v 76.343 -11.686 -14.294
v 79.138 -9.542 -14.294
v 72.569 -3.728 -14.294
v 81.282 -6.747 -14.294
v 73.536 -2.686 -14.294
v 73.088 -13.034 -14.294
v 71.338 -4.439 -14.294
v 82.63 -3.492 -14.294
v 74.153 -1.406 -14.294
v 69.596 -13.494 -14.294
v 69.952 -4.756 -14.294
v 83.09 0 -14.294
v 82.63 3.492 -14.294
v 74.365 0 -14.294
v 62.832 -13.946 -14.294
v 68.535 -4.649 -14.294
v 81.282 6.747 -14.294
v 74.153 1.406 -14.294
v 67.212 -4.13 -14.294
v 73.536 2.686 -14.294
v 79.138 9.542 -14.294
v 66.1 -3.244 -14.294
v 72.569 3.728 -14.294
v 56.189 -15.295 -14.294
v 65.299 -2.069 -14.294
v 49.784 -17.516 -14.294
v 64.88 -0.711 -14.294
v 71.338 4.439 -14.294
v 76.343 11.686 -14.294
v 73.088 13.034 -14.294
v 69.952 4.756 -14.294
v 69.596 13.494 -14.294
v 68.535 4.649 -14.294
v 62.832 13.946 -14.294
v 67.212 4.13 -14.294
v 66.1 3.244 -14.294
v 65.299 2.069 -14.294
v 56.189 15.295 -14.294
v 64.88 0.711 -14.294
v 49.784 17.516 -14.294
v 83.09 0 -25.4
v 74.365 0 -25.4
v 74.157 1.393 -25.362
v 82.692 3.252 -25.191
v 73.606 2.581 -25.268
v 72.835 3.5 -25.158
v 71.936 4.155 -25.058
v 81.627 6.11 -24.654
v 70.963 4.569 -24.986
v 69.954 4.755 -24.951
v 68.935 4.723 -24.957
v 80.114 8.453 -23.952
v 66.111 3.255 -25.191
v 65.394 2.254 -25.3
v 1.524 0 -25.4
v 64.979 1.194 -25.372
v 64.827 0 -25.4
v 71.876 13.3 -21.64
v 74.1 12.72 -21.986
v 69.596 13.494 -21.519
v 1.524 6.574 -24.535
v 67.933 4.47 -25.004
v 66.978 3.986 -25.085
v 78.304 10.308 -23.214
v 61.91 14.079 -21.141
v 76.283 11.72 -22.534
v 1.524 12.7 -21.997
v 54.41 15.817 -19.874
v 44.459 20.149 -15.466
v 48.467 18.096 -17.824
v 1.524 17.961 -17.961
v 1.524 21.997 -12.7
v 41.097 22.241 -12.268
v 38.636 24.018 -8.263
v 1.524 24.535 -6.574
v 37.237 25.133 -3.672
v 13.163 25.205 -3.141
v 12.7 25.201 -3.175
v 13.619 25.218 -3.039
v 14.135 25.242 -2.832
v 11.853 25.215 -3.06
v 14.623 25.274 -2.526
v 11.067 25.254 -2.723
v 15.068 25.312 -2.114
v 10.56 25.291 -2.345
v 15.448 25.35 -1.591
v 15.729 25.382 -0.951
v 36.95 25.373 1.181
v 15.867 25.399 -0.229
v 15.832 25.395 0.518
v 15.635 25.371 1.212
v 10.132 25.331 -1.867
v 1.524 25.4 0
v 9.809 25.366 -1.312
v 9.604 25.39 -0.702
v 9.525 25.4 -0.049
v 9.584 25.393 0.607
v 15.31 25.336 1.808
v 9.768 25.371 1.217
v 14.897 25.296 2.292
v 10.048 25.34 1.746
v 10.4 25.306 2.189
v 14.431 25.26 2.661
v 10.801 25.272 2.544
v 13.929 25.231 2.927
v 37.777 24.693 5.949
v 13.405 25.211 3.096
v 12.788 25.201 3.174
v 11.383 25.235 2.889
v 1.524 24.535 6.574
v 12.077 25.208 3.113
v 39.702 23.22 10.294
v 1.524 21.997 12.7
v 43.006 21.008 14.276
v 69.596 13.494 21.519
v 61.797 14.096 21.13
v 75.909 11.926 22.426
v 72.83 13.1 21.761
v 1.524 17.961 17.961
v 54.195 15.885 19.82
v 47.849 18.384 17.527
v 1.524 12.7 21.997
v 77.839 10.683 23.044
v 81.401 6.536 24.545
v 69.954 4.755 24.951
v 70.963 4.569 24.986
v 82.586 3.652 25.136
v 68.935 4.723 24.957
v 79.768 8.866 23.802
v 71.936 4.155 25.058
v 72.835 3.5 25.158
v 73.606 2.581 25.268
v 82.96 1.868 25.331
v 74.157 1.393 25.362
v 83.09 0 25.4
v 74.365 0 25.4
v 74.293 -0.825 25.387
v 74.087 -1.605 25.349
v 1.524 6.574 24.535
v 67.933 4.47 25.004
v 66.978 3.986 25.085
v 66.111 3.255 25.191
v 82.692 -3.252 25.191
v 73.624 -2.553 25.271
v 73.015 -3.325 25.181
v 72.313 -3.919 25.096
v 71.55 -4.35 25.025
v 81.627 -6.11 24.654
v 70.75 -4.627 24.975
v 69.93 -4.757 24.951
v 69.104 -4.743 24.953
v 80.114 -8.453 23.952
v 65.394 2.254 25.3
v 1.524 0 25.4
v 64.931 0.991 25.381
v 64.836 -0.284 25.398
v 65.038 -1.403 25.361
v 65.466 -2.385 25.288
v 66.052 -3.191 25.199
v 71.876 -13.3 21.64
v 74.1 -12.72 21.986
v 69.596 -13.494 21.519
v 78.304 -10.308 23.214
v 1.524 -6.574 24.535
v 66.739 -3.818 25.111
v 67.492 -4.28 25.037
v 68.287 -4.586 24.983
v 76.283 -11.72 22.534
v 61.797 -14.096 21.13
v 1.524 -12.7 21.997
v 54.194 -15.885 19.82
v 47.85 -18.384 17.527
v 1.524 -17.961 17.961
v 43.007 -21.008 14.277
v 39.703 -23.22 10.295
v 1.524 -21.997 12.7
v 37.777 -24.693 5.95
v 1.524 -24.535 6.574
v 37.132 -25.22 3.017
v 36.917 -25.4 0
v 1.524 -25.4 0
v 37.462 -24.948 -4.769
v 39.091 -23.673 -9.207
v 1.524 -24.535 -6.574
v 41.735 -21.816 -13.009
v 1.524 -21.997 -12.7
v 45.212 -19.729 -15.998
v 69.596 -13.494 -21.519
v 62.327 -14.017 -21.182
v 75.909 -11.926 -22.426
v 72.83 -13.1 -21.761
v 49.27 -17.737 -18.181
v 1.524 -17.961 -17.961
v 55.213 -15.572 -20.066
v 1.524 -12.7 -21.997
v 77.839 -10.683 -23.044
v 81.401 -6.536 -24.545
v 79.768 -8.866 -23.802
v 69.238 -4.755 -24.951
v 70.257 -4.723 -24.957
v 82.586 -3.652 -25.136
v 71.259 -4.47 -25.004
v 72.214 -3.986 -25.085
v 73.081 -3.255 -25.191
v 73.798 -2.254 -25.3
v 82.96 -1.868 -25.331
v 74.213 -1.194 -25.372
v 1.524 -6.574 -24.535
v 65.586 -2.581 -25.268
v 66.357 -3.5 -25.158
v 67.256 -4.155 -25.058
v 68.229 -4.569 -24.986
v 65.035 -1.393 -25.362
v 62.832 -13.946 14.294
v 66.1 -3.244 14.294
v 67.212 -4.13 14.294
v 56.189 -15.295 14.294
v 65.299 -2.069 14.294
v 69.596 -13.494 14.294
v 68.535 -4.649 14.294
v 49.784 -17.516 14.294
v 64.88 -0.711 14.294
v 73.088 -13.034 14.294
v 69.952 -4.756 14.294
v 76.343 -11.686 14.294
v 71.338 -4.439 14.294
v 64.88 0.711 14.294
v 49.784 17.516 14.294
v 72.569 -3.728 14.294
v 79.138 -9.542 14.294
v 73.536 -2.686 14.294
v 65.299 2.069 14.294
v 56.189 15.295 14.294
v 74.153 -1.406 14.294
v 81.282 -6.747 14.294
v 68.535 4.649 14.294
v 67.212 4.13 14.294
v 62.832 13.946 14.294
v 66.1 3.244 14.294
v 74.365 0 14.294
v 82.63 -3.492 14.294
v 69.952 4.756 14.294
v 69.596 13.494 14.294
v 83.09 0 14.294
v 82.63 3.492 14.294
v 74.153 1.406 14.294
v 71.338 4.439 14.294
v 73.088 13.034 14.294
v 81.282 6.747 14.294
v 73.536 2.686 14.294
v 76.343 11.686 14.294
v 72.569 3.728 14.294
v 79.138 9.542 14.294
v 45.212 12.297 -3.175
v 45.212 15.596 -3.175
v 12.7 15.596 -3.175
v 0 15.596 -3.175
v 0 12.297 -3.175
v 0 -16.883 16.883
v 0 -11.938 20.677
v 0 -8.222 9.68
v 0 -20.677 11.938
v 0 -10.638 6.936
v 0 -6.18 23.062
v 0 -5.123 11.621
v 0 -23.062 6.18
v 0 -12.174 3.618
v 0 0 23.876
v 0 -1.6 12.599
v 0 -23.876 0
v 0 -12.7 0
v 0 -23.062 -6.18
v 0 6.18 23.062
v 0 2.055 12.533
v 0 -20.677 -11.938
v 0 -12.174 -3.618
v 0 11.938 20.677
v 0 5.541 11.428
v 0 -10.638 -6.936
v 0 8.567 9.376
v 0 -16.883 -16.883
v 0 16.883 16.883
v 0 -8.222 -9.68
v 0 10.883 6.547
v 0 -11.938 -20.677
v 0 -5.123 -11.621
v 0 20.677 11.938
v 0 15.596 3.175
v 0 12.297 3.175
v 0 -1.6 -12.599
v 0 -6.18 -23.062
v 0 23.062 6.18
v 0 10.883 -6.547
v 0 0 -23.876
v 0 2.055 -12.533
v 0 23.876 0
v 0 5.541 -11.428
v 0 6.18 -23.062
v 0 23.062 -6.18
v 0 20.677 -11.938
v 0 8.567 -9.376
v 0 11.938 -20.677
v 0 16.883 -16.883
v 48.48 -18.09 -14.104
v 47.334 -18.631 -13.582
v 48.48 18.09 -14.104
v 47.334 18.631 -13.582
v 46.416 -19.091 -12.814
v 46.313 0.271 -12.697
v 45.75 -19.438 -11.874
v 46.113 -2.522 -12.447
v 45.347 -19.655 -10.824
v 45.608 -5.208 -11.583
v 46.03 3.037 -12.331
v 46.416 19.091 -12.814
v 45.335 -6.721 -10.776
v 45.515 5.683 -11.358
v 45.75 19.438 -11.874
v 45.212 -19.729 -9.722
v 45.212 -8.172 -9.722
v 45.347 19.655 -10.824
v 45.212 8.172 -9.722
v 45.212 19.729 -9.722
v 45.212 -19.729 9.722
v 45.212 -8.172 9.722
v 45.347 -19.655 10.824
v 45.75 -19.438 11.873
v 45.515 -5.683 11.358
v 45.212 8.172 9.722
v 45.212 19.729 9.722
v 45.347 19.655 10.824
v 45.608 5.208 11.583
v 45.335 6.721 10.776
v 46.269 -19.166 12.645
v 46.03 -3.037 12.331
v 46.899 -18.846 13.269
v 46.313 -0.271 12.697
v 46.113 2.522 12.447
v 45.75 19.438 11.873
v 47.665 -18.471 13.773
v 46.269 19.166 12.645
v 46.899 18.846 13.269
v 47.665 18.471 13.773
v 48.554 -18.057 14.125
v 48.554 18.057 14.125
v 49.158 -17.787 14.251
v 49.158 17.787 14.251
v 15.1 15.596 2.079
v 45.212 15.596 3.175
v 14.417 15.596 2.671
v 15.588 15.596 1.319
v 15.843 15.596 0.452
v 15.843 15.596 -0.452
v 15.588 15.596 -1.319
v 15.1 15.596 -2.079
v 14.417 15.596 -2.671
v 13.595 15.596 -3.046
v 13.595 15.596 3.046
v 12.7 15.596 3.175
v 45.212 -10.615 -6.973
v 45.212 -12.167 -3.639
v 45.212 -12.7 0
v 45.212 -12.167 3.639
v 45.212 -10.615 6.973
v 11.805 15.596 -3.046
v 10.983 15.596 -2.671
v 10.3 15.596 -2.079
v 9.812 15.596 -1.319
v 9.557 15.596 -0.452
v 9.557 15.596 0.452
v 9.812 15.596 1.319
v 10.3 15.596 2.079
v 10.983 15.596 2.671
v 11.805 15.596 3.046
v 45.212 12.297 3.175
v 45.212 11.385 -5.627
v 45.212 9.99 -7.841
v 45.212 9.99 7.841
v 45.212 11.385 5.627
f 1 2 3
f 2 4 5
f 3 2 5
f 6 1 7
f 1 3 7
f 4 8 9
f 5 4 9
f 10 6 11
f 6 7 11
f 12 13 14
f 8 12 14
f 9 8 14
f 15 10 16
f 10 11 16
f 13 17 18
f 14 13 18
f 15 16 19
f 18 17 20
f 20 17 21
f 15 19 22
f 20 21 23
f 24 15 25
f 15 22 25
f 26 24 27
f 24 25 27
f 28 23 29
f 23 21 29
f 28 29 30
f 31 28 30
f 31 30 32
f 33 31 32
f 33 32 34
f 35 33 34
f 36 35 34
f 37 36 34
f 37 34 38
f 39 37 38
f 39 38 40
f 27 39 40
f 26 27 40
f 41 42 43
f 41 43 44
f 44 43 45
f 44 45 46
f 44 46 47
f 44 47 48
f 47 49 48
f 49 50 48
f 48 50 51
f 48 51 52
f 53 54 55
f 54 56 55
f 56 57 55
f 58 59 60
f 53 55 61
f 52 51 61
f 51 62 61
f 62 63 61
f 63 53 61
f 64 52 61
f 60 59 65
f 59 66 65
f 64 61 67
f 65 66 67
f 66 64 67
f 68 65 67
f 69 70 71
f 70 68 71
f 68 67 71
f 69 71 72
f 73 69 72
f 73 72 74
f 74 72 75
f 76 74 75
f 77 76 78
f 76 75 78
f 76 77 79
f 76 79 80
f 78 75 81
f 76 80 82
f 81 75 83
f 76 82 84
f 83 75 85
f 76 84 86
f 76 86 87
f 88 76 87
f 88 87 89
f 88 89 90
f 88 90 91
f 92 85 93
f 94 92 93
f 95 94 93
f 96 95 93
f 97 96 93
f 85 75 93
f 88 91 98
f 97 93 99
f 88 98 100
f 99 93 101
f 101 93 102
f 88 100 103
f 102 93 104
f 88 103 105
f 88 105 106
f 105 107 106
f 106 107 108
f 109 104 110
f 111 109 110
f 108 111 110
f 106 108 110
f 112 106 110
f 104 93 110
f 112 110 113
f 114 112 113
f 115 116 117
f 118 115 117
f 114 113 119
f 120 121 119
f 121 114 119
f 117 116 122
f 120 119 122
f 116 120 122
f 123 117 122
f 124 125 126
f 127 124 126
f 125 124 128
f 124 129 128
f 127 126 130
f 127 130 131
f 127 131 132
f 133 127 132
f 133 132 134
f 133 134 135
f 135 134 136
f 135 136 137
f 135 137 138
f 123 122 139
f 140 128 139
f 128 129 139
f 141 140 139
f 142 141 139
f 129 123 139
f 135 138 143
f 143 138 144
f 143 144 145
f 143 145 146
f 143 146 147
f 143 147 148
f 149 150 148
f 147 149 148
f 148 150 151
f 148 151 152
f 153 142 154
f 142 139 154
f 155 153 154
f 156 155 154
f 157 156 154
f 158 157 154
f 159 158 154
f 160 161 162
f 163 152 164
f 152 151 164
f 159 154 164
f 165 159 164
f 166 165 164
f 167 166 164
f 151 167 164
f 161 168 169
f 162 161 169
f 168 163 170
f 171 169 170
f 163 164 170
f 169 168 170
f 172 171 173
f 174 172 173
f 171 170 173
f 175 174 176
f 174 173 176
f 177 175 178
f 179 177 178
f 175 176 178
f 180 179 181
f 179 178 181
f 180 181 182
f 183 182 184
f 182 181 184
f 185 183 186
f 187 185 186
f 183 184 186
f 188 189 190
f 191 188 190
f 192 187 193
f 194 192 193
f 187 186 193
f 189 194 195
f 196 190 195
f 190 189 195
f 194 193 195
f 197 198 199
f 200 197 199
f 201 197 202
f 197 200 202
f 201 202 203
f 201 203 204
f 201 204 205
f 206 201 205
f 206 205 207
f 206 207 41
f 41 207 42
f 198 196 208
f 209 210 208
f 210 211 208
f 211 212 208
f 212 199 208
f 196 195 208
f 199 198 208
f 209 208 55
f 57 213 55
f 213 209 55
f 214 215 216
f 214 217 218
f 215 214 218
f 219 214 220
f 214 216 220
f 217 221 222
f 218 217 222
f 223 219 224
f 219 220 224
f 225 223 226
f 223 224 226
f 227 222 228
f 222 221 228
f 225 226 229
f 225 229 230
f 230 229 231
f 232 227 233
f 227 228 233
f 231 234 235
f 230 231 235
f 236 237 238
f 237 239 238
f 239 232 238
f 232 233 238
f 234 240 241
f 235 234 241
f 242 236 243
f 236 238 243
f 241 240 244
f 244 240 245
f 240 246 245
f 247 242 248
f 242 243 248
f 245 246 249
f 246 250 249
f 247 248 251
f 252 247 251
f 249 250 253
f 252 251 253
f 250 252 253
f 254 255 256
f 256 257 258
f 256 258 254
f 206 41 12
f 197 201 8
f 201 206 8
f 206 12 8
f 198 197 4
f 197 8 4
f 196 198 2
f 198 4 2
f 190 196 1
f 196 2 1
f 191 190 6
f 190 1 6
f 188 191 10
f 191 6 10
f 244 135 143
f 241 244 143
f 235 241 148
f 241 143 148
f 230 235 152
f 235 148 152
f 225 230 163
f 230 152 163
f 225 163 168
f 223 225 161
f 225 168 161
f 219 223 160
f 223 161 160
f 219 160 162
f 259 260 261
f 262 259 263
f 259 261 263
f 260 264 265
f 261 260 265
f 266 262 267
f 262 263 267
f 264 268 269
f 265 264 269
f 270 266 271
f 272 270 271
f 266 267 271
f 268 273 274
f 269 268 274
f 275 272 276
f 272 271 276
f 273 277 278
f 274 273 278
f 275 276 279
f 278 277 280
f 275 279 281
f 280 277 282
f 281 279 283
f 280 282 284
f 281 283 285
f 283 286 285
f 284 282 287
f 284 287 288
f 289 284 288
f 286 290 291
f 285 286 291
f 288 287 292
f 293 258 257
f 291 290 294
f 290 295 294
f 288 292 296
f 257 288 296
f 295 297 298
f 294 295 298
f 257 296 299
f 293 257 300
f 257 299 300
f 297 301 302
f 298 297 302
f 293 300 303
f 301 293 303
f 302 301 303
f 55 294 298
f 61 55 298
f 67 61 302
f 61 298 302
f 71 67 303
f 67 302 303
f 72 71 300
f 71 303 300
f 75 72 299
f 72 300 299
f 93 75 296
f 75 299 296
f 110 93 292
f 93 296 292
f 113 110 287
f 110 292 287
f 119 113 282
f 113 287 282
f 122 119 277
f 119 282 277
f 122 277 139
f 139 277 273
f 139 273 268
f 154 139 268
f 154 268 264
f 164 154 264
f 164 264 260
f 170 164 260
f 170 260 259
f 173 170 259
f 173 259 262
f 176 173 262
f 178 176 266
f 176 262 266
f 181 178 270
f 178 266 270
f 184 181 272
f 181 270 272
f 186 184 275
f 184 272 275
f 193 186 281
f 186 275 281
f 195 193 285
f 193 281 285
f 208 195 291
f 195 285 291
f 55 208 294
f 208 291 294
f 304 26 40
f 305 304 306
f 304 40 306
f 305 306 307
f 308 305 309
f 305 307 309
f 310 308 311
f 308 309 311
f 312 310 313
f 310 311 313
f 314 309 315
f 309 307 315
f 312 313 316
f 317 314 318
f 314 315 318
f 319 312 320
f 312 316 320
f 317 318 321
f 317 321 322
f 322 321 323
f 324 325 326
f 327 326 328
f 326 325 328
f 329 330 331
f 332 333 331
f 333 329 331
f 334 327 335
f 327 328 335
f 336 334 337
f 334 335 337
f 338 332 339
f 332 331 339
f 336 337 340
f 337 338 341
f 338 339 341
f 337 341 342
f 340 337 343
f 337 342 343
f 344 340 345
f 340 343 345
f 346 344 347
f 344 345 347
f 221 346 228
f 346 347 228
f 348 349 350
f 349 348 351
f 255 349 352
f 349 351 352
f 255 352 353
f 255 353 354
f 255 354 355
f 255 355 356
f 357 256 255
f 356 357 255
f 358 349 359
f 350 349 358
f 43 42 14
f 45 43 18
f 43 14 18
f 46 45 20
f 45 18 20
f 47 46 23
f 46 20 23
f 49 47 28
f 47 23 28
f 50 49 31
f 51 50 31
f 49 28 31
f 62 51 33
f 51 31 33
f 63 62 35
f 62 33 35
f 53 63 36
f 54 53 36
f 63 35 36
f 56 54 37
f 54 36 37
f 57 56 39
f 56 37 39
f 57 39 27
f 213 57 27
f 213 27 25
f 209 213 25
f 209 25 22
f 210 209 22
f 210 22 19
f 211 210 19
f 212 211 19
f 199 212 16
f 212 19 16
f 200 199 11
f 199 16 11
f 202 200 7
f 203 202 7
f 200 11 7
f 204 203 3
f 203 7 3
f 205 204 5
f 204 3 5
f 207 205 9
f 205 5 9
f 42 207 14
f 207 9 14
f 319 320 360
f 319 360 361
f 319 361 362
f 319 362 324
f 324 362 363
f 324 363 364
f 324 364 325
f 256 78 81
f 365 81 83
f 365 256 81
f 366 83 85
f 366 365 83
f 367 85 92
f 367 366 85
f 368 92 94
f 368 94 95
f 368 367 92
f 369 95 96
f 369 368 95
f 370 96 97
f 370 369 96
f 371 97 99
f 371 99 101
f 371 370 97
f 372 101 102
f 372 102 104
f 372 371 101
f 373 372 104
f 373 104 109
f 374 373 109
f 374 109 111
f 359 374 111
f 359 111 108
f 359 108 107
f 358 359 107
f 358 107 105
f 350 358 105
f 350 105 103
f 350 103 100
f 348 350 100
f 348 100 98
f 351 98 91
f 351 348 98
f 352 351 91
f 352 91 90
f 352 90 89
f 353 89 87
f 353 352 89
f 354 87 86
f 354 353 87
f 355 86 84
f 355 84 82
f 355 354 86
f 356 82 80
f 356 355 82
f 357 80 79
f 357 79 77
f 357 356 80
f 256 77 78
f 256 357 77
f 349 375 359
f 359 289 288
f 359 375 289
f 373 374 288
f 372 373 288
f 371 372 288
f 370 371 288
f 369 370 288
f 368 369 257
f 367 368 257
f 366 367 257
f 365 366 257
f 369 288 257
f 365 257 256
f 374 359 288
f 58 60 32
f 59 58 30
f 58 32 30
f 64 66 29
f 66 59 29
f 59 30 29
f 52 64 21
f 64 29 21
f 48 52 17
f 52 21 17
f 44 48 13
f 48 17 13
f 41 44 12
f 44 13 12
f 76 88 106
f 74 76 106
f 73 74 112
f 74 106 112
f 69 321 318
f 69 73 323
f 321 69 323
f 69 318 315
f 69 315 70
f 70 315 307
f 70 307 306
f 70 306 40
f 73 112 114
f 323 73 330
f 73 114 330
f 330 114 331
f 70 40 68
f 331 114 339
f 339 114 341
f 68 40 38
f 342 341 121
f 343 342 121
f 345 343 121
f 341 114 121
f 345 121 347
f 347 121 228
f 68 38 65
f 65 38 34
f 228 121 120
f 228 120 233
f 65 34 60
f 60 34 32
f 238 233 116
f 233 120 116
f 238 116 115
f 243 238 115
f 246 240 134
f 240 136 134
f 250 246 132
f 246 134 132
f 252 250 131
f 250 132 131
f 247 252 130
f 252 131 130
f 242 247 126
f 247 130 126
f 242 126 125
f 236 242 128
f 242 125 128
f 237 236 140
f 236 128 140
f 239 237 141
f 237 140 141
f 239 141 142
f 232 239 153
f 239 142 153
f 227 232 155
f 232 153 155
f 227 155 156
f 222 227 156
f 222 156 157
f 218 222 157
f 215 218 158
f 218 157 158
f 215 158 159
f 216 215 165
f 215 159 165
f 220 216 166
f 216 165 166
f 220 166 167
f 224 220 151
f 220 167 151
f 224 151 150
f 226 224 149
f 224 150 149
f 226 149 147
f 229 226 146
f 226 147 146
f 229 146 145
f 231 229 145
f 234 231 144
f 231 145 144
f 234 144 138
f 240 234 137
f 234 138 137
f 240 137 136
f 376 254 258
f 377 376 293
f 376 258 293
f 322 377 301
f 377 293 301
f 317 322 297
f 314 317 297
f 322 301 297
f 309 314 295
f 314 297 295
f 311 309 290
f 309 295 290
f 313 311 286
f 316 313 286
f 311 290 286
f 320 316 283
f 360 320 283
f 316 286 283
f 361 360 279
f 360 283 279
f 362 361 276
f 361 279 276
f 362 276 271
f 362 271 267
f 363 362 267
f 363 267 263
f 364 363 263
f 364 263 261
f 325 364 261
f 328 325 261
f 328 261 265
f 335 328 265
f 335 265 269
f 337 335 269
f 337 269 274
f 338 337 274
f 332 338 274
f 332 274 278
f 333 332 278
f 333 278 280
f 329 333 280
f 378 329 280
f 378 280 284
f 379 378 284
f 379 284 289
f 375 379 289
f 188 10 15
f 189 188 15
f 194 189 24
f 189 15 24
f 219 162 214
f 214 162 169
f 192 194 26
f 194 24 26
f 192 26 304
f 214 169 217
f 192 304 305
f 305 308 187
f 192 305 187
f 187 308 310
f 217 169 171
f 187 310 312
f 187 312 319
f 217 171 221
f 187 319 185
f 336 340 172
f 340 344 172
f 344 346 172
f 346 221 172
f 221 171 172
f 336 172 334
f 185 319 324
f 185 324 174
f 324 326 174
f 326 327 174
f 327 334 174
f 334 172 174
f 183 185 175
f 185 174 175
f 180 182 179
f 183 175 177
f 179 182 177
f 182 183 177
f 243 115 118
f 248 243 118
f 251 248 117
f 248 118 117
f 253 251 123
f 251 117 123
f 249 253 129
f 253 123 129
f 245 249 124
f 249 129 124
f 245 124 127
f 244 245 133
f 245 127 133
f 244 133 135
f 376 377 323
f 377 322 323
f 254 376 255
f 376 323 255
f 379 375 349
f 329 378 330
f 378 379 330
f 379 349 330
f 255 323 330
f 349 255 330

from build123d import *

# Parameters (mm, degrees)
SKETCH1_R               = 25.4
BOSS_EXTRUDE1_DEPTH     = 83.08975
CUT_EXTRUDE1_DEPTH      = 43.688
SKETCH5_R               = 4.76885
CUT_EXTRUDE2_DEPTH      = 43.688
CUT_EXTRUDE3_DEPTH      = 43.688
CUT_EXTRUDE4_DEPTH      = 87.376
CUT_EXTRUDE4_DEPTH_BACK = 58.744653114
CHAMFER1_SIZE           = 1.524
SKETCH9_R               = 3.175
CUT_EXTRUDE5_DEPTH      = 91.521967399


with BuildPart() as part:
    # Sketch1 → Boss-Extrude1 (new body)
    with BuildSketch(Plane(origin=(0, 0, 0), x_dir=(0, 0, -1), z_dir=(1, 0, 0))):
        Circle(SKETCH1_R)
    extrude(amount=BOSS_EXTRUDE1_DEPTH)

    # Sketch4 → Cut-Extrude1 (cut, symmetric)
    with BuildSketch(Plane.XY):
        with BuildLine():
            Line((36.9170127, -25.4), (83.08975, -25.4))
            Line((83.08975, -25.4), (83.08975, 0))
            ThreePointArc((83.08975, 0), (79.137522129, -9.541522129), (69.596, -13.49375))
            ThreePointArc((69.596, -13.49375), (52.205808799, -16.563033999), (36.9170127, -25.4))
        make_face()
        with BuildLine():
            ThreePointArc((69.596, 13.49375), (79.137522129, 9.541522129), (83.08975, 0))
            Line((83.08975, 0), (83.08975, 25.4))
            Line((83.08975, 25.4), (36.9170127, 25.4))
            ThreePointArc((36.9170127, 25.4), (52.205808799, 16.563033999), (69.596, 13.49375))
        make_face()
    extrude(amount=CUT_EXTRUDE1_DEPTH, both=True, mode=Mode.SUBTRACT)

    # Sketch5 → Cut-Extrude2 (cut, symmetric)
    with BuildSketch(Plane.XY):
        with Locations((69.596, 0)):
            Circle(SKETCH5_R)
    extrude(amount=CUT_EXTRUDE2_DEPTH, both=True, mode=Mode.SUBTRACT)

    # Sketch6 → Cut-Extrude3 (cut, symmetric)
    with BuildSketch(Plane(origin=(0, 0, 0), x_dir=(1, 0, 0), z_dir=(0, 1, 0))):
        with BuildLine():
            Line((83.08975, 14.29385), (49.784, 14.29385))
            ThreePointArc((49.784, 14.29385), (46.551107796, 12.954742204), (45.212, 9.72185))
            Line((45.212, 9.72185), (45.212, -9.72185))
            ThreePointArc((45.212, -9.72185), (46.551107796, -12.954742204), (49.784, -14.29385))
            Line((49.784, -14.29385), (83.08975, -14.29385))
            Line((83.08975, -14.29385), (83.08975, 14.29385))
        make_face()
    extrude(amount=CUT_EXTRUDE3_DEPTH, both=True, mode=Mode.SUBTRACT)

    # Sketch7 → Cut-Extrude4 (cut, two sides: drawn at the far end of the back side and taken through both)
    with BuildSketch(Plane(origin=(45.212, 0, 0), x_dir=(0, 0, -1), z_dir=(1, 0, 0)).offset(-CUT_EXTRUDE4_DEPTH_BACK)):
        with BuildLine():
            Line((-3.175, 12.296722124), (-3.175, 15.5956))
            Line((-3.175, 15.5956), (3.175, 15.5956))
            Line((3.175, 15.5956), (3.175, 12.296722124))
            ThreePointArc((3.175, 12.296722124), (0, -12.7), (-3.175, 12.296722124))
        make_face()
    extrude(amount=CUT_EXTRUDE4_DEPTH + CUT_EXTRUDE4_DEPTH_BACK, mode=Mode.SUBTRACT)

    # Chamfer1
    chamfer1_edges = [part.edges().sort_by_distance(p)[0] for p in [
        (0, 0, 25.4),
    ]]
    chamfer(chamfer1_edges, length=CHAMFER1_SIZE)

    # Sketch9 → Cut-Extrude5 (cut, through all)
    with BuildSketch(Plane(origin=(0, 0, 0), x_dir=(1, 0, 0), z_dir=(0, 1, 0))):
        with Locations((12.7, 0)):
            Circle(SKETCH9_R)
    extrude(amount=CUT_EXTRUDE5_DEPTH, mode=Mode.SUBTRACT)


solid = part.part
